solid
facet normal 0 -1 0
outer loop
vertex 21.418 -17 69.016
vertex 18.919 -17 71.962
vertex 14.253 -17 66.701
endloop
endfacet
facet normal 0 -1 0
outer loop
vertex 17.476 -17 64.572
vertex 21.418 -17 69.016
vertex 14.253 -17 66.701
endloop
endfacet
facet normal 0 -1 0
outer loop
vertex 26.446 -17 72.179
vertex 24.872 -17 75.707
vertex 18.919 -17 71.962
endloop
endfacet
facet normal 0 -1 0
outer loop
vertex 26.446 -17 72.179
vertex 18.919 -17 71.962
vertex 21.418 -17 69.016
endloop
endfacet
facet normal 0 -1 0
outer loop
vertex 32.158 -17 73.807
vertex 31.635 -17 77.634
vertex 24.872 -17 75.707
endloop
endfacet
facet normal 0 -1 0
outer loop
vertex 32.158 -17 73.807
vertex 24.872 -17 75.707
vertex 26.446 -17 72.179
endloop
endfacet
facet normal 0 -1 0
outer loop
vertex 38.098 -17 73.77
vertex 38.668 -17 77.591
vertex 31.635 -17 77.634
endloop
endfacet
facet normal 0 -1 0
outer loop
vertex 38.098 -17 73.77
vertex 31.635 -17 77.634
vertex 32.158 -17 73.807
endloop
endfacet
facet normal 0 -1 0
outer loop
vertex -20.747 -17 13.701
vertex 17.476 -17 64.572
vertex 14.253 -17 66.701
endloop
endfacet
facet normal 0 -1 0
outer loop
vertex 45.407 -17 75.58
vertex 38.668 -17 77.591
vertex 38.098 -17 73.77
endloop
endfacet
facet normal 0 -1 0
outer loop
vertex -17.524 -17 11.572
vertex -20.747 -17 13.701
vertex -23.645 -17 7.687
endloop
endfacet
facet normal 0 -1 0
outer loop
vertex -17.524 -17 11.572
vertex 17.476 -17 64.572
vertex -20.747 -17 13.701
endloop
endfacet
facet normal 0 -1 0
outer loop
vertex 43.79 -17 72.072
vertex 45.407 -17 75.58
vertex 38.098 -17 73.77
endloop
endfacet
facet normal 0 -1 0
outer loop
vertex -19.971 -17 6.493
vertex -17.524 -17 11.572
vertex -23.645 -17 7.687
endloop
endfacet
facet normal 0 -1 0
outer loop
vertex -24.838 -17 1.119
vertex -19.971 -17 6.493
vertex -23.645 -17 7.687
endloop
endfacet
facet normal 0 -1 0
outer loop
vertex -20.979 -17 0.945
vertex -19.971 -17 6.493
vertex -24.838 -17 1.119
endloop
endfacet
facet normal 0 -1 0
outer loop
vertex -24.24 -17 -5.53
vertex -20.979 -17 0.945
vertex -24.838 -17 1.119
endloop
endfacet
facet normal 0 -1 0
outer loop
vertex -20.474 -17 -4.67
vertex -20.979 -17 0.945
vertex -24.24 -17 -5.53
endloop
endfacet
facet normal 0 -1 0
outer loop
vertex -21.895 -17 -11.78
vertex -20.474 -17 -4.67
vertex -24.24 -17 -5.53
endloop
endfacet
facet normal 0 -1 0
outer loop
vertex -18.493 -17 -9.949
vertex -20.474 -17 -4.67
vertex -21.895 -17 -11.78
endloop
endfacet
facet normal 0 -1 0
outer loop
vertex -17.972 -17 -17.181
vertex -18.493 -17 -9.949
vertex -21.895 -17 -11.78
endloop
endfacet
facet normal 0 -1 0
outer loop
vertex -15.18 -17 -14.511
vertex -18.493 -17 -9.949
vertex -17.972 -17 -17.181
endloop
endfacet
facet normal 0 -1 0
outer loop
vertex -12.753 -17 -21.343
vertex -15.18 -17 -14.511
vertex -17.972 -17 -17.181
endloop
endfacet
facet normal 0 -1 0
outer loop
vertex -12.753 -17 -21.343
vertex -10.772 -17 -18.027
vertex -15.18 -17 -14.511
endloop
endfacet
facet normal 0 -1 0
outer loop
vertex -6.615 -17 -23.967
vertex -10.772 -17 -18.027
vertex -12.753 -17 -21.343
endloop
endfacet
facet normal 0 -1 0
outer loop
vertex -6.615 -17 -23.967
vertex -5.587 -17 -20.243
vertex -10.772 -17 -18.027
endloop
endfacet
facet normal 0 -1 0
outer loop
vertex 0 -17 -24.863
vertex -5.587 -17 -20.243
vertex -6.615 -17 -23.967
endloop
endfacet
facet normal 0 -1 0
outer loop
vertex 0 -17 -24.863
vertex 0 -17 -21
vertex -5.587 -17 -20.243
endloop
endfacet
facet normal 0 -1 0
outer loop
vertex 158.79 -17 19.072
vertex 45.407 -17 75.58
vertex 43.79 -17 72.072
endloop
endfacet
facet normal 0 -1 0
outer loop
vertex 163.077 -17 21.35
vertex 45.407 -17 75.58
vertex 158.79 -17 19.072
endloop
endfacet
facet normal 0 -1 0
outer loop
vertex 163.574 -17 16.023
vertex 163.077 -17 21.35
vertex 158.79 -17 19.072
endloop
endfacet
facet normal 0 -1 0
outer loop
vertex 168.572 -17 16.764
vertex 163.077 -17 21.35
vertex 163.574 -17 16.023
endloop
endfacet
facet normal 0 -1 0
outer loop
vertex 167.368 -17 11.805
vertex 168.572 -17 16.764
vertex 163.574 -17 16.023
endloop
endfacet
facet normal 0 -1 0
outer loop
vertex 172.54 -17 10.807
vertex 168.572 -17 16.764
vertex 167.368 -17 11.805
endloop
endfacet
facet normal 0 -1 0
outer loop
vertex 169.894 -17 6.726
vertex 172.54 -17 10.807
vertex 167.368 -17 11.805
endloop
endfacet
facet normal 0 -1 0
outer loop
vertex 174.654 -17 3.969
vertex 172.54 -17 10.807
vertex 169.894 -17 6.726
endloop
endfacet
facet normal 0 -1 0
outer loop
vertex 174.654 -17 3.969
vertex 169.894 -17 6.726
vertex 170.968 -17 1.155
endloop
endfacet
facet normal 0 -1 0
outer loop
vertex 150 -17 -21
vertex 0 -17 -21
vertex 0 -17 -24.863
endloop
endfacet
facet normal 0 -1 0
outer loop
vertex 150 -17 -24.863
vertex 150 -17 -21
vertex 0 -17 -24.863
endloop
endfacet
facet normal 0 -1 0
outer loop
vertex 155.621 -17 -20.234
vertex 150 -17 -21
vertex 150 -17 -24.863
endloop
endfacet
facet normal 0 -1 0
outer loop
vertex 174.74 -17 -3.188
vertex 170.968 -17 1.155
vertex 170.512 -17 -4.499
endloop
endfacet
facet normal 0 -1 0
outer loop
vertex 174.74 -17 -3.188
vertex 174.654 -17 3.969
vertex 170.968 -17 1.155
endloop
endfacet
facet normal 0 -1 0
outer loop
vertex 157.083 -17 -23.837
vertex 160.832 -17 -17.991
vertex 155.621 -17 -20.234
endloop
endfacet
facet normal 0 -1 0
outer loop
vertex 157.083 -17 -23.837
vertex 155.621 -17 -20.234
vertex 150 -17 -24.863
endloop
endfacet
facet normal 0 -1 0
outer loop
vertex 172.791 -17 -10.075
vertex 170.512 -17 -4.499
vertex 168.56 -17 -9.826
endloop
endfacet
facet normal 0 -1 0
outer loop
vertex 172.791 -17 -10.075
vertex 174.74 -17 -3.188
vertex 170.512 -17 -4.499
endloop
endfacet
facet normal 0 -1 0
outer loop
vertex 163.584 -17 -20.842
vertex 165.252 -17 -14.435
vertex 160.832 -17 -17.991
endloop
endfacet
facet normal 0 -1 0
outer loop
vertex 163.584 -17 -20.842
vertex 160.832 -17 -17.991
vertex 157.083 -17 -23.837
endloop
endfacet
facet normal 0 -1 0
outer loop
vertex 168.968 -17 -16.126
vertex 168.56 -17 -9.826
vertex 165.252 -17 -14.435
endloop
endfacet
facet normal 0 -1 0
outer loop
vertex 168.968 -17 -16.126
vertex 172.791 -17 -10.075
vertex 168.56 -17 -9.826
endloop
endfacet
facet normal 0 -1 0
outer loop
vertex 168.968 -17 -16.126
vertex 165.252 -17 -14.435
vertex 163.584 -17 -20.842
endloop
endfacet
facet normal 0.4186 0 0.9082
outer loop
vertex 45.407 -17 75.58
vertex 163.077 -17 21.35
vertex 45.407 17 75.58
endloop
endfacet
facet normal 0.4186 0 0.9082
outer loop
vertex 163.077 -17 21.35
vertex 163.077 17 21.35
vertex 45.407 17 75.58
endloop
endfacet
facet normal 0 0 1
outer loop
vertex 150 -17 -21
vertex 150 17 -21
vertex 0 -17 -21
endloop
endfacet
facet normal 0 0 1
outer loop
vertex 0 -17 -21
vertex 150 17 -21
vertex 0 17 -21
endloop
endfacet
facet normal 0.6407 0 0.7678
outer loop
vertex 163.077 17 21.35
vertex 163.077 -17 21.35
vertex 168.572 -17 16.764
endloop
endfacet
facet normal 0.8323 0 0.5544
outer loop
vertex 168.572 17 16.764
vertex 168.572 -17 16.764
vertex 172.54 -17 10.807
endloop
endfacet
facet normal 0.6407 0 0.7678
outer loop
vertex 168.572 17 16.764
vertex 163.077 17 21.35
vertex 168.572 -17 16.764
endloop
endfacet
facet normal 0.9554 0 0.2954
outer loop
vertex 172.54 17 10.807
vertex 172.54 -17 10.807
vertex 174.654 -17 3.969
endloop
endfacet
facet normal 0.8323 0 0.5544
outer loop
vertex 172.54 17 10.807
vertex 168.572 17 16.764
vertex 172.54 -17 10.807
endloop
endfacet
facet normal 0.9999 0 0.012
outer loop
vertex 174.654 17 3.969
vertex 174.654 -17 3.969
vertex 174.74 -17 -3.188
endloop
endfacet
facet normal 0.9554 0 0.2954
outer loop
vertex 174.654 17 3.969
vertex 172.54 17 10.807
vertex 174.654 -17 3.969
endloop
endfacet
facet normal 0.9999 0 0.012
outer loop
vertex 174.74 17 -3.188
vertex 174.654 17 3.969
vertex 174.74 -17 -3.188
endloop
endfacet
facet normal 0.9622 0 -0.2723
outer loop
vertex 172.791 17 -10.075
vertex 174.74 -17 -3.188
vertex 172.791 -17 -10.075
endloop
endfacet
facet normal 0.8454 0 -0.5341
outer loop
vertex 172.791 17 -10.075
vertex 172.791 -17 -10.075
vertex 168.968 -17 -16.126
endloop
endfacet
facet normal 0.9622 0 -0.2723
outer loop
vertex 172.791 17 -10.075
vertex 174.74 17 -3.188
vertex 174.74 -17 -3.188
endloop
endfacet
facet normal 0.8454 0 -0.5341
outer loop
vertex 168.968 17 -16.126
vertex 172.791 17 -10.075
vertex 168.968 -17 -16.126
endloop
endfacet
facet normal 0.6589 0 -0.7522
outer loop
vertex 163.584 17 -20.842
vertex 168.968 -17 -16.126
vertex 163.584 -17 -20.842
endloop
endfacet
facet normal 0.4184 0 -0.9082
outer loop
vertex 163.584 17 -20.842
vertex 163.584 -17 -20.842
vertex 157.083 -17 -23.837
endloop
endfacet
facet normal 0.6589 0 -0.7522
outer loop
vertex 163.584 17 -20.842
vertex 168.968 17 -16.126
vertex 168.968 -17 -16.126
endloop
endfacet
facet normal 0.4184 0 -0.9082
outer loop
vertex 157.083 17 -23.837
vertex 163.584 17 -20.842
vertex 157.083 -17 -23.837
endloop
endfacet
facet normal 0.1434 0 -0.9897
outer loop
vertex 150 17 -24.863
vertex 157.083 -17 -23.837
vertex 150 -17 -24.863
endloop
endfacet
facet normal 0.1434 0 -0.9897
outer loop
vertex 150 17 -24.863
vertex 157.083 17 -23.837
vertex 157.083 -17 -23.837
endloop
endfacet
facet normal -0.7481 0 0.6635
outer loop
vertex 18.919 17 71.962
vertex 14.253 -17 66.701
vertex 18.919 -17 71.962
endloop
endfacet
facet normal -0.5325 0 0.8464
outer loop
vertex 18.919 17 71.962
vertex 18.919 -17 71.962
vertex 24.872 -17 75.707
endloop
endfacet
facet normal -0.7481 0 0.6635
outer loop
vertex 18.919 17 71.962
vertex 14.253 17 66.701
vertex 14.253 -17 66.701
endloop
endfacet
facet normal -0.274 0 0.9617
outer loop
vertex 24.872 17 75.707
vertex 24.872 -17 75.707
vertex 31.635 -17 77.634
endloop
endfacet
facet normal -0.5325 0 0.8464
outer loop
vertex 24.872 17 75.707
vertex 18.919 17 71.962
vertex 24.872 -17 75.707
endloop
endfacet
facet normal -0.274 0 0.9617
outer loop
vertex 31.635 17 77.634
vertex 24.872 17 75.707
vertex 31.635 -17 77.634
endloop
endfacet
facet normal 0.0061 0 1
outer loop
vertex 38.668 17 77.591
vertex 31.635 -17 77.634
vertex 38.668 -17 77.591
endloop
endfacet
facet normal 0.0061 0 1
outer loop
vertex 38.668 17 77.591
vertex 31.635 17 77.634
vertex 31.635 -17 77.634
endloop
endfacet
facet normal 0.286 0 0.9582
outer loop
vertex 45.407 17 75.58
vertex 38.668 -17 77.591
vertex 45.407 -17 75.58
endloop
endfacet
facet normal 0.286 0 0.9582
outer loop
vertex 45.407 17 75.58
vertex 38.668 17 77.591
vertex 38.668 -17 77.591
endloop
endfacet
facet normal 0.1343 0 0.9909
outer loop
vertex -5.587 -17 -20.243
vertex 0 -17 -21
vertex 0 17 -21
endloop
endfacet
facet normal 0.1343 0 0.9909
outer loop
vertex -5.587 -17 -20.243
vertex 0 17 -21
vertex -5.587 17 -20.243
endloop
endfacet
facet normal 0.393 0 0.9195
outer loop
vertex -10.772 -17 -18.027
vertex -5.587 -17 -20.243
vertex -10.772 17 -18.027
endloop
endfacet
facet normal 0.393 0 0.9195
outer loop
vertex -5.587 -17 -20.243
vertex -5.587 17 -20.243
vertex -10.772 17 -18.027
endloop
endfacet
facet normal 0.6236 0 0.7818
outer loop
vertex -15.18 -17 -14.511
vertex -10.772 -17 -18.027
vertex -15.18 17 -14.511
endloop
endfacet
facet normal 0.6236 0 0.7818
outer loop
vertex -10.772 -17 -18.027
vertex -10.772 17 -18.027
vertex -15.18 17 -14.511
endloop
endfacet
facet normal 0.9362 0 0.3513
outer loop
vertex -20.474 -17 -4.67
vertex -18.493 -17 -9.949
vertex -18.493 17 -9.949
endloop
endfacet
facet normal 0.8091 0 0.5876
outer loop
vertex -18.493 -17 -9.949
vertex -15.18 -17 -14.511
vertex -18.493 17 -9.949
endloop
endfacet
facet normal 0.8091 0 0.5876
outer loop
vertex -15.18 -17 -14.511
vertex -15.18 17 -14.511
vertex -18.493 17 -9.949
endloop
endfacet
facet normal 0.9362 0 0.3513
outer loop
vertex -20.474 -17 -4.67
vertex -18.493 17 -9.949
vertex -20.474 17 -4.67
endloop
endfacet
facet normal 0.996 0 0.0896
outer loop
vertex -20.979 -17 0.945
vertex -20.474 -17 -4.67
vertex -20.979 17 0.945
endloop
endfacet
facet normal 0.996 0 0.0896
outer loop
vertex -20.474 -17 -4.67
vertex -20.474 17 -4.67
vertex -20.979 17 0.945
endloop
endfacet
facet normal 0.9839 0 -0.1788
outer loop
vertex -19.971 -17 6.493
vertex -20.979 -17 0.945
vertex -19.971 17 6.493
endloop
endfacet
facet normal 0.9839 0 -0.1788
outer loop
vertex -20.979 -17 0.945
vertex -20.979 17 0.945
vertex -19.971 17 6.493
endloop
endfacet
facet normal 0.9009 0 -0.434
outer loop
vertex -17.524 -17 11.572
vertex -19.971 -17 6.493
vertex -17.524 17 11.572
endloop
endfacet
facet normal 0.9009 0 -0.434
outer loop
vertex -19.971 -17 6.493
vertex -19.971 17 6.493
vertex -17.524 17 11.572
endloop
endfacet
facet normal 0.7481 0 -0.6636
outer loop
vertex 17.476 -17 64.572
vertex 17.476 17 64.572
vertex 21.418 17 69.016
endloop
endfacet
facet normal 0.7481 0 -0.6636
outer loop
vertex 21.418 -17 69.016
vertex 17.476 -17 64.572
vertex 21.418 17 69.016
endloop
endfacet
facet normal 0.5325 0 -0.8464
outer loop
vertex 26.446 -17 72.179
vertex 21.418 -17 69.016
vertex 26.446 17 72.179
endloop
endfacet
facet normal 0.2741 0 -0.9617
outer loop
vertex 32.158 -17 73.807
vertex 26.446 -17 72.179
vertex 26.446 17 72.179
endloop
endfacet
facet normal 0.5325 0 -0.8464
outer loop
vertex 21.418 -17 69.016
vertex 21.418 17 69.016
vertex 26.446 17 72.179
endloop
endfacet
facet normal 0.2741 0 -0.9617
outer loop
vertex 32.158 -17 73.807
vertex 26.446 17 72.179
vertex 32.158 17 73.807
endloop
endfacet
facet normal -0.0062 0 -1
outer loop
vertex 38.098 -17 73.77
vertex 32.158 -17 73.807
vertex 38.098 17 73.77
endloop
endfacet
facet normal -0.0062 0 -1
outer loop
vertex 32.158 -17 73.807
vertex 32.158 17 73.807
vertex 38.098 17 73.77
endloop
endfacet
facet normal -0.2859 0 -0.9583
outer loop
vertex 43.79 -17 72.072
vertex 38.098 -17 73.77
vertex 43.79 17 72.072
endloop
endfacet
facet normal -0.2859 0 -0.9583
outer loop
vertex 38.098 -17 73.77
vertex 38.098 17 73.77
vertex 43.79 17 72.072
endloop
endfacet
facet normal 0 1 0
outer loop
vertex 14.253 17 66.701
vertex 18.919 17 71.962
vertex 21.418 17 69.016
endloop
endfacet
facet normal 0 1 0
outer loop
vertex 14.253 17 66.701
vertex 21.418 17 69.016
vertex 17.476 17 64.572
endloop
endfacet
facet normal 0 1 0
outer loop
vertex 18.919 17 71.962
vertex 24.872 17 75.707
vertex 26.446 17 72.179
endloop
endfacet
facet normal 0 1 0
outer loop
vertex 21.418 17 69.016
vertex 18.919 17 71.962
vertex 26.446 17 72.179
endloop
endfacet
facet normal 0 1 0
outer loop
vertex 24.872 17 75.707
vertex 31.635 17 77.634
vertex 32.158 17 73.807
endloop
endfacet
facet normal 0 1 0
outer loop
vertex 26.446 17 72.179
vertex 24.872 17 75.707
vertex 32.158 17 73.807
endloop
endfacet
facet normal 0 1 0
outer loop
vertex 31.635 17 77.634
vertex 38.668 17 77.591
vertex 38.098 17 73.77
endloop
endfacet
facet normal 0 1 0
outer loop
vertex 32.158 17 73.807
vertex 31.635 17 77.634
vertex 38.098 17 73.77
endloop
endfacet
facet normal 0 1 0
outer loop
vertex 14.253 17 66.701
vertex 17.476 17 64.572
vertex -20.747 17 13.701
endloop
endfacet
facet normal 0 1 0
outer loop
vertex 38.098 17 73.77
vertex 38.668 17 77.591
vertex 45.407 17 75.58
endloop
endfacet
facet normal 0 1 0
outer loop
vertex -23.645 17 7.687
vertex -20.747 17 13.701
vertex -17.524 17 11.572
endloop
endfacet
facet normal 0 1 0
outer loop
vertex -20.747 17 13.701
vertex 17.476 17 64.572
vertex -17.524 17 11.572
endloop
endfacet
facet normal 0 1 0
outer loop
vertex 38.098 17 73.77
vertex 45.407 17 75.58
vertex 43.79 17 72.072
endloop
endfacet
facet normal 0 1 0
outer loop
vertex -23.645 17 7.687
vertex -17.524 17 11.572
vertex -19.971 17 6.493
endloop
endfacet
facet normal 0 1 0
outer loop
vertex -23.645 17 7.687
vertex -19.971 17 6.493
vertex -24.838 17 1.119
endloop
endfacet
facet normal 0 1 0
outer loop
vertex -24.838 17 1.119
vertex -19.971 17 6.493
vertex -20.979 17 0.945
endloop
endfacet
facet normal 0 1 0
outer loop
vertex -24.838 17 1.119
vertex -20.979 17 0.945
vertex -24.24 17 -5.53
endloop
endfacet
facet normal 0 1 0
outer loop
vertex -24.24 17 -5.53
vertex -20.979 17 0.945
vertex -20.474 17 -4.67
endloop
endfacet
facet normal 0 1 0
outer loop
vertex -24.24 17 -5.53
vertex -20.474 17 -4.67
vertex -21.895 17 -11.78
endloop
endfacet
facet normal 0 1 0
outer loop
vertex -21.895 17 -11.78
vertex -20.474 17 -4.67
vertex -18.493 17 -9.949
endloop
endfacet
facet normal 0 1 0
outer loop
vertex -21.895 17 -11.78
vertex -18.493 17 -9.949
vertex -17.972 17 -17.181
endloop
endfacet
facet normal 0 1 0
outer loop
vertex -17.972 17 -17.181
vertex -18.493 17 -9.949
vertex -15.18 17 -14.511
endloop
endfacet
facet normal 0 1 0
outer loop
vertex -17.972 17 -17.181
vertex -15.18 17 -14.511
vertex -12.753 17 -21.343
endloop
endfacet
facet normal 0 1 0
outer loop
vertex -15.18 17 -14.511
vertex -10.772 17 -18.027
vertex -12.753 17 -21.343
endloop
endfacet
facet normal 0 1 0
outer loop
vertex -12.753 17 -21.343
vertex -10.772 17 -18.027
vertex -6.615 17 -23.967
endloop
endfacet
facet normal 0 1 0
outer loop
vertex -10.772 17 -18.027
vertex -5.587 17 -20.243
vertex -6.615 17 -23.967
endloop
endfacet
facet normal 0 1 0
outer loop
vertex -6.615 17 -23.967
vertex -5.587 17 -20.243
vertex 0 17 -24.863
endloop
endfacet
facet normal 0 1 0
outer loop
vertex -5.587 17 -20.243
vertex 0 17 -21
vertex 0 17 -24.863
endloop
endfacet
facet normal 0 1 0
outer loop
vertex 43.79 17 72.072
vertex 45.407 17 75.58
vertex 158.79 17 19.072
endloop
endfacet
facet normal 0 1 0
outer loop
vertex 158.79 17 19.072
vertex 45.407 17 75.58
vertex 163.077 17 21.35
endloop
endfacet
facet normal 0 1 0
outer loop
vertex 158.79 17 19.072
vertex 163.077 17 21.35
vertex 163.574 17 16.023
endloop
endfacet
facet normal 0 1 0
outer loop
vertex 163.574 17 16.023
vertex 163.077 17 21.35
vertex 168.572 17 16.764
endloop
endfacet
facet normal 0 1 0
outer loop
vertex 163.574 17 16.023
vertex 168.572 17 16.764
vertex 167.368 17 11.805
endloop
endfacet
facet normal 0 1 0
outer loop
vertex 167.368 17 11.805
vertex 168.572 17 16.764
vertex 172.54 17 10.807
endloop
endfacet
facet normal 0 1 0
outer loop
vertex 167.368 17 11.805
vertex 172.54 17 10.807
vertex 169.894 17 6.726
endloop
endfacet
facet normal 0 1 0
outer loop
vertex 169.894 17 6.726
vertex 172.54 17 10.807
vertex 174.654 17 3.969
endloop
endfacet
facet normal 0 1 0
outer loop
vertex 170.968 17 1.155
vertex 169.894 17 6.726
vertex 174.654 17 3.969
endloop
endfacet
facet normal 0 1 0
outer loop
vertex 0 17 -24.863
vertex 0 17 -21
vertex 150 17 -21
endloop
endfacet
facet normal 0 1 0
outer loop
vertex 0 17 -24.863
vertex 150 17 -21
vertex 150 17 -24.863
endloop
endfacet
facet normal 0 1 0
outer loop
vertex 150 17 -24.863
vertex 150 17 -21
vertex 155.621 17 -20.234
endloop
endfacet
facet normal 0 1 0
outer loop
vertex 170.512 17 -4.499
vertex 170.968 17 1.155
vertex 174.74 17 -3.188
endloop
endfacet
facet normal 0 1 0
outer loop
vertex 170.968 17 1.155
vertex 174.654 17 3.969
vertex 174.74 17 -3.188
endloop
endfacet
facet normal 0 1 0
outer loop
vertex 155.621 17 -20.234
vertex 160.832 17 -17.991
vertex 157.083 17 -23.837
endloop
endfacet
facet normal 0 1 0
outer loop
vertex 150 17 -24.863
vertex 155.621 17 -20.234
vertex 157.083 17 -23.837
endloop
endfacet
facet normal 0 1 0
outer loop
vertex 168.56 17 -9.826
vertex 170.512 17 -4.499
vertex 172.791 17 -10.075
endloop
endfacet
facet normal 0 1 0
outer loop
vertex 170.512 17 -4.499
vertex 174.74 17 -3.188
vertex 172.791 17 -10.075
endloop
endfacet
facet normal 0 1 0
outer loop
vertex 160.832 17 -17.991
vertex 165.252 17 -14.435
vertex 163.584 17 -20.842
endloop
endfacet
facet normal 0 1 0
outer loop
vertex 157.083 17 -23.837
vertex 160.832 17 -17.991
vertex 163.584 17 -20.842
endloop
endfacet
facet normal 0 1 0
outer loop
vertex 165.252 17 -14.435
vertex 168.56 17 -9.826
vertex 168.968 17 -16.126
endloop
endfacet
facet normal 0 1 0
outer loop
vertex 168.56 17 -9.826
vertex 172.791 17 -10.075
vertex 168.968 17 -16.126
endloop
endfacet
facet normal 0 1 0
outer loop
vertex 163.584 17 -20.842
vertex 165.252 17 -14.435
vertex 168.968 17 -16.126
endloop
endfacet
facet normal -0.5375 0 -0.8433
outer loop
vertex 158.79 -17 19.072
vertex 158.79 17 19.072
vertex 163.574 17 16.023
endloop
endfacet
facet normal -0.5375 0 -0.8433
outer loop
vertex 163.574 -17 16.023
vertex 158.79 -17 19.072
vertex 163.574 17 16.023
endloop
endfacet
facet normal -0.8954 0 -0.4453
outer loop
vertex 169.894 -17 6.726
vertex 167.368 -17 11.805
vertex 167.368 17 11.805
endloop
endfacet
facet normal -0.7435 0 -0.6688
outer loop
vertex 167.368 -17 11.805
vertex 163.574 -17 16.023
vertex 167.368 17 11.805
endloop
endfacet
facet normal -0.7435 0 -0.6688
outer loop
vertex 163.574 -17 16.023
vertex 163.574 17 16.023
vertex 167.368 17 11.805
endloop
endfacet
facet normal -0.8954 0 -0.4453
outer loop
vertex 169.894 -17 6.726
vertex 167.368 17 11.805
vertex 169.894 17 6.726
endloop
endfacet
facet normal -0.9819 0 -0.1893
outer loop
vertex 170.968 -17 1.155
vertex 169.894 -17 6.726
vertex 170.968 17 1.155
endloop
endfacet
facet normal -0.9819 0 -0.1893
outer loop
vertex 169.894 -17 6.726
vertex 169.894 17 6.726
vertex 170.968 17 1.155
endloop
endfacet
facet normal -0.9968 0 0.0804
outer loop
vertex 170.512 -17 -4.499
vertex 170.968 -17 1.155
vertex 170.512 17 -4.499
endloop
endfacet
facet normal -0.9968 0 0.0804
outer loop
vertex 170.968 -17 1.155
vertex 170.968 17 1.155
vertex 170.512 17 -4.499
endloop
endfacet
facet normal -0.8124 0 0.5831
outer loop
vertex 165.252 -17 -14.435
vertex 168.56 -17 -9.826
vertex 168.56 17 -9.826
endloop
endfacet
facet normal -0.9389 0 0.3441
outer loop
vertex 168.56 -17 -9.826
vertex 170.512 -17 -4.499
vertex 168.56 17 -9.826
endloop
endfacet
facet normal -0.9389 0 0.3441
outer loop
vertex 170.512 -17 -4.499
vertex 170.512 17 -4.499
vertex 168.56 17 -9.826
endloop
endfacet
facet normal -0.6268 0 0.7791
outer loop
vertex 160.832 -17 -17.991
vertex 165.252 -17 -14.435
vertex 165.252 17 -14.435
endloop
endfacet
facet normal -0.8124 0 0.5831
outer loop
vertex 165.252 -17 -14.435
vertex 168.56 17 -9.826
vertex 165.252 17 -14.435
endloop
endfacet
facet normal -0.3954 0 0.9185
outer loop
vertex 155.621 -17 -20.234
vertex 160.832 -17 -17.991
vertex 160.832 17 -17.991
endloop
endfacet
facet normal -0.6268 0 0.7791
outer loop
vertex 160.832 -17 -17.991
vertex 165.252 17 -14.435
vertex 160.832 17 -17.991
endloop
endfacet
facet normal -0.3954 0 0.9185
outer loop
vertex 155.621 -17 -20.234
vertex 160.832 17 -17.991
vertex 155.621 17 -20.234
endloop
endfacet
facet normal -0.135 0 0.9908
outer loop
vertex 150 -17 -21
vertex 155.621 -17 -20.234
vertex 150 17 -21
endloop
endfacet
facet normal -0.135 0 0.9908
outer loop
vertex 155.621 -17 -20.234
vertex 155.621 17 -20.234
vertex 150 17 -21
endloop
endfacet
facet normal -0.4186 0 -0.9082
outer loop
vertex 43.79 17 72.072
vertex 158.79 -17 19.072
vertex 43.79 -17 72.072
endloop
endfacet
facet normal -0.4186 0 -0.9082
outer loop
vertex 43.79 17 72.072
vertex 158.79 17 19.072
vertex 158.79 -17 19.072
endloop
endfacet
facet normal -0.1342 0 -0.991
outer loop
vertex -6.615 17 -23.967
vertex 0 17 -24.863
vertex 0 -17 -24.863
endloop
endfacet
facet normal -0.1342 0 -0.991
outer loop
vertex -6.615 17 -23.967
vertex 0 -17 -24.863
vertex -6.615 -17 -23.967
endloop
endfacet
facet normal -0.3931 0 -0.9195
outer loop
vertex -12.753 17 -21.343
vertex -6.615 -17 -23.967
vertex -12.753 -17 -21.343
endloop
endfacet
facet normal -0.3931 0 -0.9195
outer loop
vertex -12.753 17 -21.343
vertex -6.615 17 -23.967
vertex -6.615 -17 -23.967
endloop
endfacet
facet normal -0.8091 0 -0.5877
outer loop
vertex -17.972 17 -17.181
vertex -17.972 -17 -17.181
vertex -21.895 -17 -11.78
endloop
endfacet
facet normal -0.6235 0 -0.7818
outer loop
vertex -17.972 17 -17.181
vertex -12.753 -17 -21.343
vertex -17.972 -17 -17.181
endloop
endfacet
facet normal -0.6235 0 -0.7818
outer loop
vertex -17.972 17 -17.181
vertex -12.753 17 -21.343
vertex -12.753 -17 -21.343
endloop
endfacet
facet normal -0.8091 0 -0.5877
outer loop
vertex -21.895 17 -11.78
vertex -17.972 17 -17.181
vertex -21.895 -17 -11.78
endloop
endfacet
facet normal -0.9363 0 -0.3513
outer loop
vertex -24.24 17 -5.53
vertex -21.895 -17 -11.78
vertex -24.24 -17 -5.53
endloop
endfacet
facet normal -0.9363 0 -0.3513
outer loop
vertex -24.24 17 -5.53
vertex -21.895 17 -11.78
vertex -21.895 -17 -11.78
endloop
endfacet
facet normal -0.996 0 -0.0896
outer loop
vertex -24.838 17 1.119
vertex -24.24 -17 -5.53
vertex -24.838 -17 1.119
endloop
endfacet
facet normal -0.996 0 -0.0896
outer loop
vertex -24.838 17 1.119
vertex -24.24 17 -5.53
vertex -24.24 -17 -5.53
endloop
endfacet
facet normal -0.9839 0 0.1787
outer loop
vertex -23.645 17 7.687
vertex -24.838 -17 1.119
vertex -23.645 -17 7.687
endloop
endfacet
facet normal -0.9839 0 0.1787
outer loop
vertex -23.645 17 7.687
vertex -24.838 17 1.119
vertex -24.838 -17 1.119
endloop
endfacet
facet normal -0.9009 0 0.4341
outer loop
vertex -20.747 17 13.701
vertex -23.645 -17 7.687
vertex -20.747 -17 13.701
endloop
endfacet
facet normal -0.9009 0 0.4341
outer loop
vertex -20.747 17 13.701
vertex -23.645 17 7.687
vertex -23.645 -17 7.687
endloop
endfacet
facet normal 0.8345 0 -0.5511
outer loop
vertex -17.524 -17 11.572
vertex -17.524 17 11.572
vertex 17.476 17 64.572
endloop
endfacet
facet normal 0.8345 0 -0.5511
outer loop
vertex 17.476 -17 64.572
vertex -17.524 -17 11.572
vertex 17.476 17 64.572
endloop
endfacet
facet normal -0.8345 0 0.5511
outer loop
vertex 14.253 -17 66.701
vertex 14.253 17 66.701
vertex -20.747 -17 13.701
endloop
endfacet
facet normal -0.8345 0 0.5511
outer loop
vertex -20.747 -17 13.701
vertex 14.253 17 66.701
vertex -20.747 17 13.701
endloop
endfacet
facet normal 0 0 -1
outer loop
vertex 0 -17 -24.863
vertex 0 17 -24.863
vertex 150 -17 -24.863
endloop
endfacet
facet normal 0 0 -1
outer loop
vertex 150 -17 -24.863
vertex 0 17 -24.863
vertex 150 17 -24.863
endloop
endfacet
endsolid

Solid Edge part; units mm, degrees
sketch "Sketch1" plane through (0, 0, 0) normal (0, -1, 0) x (1, 0, 0)
  arc A0 (150, -21) -> (158.7897, 19.072) centre (150, 0) ccw
  line L0 (158.7897, 19.072) -> (43.7897, 72.072)
  arc A1 (17.4762, 64.5723) -> (43.7897, 72.072) centre (35, 53) cw
  line L1 (-17.5238, 11.5723) -> (17.4762, 64.5723)
  arc A2 (-17.5238, 11.5723) -> (0, -21) centre (0, 0) ccw
  line L2 (150, -21) -> (0, -21)
  line L3 (14.2527, 66.7011) -> (-20.7473, 13.7011)
  arc A3 (-20.7473, 13.7011) -> (0, -24.8631) centre (0, 0) ccw
  line L4 (0, -24.8631) -> (150, -24.8631)
  arc A4 (163.0772, 21.3496) -> (150, -24.8631) centre (150, 0.0936) cw
  line L5 (163.0772, 21.3496) -> (45.4066, 75.5804)
  arc A5 (14.2527, 66.7011) -> (45.4066, 75.5804) centre (35, 53) cw
extrude "Protrusion1" add sketch "Sketch1" along normal mid plane 34
properties material "ABS Plastic, medium impact"
